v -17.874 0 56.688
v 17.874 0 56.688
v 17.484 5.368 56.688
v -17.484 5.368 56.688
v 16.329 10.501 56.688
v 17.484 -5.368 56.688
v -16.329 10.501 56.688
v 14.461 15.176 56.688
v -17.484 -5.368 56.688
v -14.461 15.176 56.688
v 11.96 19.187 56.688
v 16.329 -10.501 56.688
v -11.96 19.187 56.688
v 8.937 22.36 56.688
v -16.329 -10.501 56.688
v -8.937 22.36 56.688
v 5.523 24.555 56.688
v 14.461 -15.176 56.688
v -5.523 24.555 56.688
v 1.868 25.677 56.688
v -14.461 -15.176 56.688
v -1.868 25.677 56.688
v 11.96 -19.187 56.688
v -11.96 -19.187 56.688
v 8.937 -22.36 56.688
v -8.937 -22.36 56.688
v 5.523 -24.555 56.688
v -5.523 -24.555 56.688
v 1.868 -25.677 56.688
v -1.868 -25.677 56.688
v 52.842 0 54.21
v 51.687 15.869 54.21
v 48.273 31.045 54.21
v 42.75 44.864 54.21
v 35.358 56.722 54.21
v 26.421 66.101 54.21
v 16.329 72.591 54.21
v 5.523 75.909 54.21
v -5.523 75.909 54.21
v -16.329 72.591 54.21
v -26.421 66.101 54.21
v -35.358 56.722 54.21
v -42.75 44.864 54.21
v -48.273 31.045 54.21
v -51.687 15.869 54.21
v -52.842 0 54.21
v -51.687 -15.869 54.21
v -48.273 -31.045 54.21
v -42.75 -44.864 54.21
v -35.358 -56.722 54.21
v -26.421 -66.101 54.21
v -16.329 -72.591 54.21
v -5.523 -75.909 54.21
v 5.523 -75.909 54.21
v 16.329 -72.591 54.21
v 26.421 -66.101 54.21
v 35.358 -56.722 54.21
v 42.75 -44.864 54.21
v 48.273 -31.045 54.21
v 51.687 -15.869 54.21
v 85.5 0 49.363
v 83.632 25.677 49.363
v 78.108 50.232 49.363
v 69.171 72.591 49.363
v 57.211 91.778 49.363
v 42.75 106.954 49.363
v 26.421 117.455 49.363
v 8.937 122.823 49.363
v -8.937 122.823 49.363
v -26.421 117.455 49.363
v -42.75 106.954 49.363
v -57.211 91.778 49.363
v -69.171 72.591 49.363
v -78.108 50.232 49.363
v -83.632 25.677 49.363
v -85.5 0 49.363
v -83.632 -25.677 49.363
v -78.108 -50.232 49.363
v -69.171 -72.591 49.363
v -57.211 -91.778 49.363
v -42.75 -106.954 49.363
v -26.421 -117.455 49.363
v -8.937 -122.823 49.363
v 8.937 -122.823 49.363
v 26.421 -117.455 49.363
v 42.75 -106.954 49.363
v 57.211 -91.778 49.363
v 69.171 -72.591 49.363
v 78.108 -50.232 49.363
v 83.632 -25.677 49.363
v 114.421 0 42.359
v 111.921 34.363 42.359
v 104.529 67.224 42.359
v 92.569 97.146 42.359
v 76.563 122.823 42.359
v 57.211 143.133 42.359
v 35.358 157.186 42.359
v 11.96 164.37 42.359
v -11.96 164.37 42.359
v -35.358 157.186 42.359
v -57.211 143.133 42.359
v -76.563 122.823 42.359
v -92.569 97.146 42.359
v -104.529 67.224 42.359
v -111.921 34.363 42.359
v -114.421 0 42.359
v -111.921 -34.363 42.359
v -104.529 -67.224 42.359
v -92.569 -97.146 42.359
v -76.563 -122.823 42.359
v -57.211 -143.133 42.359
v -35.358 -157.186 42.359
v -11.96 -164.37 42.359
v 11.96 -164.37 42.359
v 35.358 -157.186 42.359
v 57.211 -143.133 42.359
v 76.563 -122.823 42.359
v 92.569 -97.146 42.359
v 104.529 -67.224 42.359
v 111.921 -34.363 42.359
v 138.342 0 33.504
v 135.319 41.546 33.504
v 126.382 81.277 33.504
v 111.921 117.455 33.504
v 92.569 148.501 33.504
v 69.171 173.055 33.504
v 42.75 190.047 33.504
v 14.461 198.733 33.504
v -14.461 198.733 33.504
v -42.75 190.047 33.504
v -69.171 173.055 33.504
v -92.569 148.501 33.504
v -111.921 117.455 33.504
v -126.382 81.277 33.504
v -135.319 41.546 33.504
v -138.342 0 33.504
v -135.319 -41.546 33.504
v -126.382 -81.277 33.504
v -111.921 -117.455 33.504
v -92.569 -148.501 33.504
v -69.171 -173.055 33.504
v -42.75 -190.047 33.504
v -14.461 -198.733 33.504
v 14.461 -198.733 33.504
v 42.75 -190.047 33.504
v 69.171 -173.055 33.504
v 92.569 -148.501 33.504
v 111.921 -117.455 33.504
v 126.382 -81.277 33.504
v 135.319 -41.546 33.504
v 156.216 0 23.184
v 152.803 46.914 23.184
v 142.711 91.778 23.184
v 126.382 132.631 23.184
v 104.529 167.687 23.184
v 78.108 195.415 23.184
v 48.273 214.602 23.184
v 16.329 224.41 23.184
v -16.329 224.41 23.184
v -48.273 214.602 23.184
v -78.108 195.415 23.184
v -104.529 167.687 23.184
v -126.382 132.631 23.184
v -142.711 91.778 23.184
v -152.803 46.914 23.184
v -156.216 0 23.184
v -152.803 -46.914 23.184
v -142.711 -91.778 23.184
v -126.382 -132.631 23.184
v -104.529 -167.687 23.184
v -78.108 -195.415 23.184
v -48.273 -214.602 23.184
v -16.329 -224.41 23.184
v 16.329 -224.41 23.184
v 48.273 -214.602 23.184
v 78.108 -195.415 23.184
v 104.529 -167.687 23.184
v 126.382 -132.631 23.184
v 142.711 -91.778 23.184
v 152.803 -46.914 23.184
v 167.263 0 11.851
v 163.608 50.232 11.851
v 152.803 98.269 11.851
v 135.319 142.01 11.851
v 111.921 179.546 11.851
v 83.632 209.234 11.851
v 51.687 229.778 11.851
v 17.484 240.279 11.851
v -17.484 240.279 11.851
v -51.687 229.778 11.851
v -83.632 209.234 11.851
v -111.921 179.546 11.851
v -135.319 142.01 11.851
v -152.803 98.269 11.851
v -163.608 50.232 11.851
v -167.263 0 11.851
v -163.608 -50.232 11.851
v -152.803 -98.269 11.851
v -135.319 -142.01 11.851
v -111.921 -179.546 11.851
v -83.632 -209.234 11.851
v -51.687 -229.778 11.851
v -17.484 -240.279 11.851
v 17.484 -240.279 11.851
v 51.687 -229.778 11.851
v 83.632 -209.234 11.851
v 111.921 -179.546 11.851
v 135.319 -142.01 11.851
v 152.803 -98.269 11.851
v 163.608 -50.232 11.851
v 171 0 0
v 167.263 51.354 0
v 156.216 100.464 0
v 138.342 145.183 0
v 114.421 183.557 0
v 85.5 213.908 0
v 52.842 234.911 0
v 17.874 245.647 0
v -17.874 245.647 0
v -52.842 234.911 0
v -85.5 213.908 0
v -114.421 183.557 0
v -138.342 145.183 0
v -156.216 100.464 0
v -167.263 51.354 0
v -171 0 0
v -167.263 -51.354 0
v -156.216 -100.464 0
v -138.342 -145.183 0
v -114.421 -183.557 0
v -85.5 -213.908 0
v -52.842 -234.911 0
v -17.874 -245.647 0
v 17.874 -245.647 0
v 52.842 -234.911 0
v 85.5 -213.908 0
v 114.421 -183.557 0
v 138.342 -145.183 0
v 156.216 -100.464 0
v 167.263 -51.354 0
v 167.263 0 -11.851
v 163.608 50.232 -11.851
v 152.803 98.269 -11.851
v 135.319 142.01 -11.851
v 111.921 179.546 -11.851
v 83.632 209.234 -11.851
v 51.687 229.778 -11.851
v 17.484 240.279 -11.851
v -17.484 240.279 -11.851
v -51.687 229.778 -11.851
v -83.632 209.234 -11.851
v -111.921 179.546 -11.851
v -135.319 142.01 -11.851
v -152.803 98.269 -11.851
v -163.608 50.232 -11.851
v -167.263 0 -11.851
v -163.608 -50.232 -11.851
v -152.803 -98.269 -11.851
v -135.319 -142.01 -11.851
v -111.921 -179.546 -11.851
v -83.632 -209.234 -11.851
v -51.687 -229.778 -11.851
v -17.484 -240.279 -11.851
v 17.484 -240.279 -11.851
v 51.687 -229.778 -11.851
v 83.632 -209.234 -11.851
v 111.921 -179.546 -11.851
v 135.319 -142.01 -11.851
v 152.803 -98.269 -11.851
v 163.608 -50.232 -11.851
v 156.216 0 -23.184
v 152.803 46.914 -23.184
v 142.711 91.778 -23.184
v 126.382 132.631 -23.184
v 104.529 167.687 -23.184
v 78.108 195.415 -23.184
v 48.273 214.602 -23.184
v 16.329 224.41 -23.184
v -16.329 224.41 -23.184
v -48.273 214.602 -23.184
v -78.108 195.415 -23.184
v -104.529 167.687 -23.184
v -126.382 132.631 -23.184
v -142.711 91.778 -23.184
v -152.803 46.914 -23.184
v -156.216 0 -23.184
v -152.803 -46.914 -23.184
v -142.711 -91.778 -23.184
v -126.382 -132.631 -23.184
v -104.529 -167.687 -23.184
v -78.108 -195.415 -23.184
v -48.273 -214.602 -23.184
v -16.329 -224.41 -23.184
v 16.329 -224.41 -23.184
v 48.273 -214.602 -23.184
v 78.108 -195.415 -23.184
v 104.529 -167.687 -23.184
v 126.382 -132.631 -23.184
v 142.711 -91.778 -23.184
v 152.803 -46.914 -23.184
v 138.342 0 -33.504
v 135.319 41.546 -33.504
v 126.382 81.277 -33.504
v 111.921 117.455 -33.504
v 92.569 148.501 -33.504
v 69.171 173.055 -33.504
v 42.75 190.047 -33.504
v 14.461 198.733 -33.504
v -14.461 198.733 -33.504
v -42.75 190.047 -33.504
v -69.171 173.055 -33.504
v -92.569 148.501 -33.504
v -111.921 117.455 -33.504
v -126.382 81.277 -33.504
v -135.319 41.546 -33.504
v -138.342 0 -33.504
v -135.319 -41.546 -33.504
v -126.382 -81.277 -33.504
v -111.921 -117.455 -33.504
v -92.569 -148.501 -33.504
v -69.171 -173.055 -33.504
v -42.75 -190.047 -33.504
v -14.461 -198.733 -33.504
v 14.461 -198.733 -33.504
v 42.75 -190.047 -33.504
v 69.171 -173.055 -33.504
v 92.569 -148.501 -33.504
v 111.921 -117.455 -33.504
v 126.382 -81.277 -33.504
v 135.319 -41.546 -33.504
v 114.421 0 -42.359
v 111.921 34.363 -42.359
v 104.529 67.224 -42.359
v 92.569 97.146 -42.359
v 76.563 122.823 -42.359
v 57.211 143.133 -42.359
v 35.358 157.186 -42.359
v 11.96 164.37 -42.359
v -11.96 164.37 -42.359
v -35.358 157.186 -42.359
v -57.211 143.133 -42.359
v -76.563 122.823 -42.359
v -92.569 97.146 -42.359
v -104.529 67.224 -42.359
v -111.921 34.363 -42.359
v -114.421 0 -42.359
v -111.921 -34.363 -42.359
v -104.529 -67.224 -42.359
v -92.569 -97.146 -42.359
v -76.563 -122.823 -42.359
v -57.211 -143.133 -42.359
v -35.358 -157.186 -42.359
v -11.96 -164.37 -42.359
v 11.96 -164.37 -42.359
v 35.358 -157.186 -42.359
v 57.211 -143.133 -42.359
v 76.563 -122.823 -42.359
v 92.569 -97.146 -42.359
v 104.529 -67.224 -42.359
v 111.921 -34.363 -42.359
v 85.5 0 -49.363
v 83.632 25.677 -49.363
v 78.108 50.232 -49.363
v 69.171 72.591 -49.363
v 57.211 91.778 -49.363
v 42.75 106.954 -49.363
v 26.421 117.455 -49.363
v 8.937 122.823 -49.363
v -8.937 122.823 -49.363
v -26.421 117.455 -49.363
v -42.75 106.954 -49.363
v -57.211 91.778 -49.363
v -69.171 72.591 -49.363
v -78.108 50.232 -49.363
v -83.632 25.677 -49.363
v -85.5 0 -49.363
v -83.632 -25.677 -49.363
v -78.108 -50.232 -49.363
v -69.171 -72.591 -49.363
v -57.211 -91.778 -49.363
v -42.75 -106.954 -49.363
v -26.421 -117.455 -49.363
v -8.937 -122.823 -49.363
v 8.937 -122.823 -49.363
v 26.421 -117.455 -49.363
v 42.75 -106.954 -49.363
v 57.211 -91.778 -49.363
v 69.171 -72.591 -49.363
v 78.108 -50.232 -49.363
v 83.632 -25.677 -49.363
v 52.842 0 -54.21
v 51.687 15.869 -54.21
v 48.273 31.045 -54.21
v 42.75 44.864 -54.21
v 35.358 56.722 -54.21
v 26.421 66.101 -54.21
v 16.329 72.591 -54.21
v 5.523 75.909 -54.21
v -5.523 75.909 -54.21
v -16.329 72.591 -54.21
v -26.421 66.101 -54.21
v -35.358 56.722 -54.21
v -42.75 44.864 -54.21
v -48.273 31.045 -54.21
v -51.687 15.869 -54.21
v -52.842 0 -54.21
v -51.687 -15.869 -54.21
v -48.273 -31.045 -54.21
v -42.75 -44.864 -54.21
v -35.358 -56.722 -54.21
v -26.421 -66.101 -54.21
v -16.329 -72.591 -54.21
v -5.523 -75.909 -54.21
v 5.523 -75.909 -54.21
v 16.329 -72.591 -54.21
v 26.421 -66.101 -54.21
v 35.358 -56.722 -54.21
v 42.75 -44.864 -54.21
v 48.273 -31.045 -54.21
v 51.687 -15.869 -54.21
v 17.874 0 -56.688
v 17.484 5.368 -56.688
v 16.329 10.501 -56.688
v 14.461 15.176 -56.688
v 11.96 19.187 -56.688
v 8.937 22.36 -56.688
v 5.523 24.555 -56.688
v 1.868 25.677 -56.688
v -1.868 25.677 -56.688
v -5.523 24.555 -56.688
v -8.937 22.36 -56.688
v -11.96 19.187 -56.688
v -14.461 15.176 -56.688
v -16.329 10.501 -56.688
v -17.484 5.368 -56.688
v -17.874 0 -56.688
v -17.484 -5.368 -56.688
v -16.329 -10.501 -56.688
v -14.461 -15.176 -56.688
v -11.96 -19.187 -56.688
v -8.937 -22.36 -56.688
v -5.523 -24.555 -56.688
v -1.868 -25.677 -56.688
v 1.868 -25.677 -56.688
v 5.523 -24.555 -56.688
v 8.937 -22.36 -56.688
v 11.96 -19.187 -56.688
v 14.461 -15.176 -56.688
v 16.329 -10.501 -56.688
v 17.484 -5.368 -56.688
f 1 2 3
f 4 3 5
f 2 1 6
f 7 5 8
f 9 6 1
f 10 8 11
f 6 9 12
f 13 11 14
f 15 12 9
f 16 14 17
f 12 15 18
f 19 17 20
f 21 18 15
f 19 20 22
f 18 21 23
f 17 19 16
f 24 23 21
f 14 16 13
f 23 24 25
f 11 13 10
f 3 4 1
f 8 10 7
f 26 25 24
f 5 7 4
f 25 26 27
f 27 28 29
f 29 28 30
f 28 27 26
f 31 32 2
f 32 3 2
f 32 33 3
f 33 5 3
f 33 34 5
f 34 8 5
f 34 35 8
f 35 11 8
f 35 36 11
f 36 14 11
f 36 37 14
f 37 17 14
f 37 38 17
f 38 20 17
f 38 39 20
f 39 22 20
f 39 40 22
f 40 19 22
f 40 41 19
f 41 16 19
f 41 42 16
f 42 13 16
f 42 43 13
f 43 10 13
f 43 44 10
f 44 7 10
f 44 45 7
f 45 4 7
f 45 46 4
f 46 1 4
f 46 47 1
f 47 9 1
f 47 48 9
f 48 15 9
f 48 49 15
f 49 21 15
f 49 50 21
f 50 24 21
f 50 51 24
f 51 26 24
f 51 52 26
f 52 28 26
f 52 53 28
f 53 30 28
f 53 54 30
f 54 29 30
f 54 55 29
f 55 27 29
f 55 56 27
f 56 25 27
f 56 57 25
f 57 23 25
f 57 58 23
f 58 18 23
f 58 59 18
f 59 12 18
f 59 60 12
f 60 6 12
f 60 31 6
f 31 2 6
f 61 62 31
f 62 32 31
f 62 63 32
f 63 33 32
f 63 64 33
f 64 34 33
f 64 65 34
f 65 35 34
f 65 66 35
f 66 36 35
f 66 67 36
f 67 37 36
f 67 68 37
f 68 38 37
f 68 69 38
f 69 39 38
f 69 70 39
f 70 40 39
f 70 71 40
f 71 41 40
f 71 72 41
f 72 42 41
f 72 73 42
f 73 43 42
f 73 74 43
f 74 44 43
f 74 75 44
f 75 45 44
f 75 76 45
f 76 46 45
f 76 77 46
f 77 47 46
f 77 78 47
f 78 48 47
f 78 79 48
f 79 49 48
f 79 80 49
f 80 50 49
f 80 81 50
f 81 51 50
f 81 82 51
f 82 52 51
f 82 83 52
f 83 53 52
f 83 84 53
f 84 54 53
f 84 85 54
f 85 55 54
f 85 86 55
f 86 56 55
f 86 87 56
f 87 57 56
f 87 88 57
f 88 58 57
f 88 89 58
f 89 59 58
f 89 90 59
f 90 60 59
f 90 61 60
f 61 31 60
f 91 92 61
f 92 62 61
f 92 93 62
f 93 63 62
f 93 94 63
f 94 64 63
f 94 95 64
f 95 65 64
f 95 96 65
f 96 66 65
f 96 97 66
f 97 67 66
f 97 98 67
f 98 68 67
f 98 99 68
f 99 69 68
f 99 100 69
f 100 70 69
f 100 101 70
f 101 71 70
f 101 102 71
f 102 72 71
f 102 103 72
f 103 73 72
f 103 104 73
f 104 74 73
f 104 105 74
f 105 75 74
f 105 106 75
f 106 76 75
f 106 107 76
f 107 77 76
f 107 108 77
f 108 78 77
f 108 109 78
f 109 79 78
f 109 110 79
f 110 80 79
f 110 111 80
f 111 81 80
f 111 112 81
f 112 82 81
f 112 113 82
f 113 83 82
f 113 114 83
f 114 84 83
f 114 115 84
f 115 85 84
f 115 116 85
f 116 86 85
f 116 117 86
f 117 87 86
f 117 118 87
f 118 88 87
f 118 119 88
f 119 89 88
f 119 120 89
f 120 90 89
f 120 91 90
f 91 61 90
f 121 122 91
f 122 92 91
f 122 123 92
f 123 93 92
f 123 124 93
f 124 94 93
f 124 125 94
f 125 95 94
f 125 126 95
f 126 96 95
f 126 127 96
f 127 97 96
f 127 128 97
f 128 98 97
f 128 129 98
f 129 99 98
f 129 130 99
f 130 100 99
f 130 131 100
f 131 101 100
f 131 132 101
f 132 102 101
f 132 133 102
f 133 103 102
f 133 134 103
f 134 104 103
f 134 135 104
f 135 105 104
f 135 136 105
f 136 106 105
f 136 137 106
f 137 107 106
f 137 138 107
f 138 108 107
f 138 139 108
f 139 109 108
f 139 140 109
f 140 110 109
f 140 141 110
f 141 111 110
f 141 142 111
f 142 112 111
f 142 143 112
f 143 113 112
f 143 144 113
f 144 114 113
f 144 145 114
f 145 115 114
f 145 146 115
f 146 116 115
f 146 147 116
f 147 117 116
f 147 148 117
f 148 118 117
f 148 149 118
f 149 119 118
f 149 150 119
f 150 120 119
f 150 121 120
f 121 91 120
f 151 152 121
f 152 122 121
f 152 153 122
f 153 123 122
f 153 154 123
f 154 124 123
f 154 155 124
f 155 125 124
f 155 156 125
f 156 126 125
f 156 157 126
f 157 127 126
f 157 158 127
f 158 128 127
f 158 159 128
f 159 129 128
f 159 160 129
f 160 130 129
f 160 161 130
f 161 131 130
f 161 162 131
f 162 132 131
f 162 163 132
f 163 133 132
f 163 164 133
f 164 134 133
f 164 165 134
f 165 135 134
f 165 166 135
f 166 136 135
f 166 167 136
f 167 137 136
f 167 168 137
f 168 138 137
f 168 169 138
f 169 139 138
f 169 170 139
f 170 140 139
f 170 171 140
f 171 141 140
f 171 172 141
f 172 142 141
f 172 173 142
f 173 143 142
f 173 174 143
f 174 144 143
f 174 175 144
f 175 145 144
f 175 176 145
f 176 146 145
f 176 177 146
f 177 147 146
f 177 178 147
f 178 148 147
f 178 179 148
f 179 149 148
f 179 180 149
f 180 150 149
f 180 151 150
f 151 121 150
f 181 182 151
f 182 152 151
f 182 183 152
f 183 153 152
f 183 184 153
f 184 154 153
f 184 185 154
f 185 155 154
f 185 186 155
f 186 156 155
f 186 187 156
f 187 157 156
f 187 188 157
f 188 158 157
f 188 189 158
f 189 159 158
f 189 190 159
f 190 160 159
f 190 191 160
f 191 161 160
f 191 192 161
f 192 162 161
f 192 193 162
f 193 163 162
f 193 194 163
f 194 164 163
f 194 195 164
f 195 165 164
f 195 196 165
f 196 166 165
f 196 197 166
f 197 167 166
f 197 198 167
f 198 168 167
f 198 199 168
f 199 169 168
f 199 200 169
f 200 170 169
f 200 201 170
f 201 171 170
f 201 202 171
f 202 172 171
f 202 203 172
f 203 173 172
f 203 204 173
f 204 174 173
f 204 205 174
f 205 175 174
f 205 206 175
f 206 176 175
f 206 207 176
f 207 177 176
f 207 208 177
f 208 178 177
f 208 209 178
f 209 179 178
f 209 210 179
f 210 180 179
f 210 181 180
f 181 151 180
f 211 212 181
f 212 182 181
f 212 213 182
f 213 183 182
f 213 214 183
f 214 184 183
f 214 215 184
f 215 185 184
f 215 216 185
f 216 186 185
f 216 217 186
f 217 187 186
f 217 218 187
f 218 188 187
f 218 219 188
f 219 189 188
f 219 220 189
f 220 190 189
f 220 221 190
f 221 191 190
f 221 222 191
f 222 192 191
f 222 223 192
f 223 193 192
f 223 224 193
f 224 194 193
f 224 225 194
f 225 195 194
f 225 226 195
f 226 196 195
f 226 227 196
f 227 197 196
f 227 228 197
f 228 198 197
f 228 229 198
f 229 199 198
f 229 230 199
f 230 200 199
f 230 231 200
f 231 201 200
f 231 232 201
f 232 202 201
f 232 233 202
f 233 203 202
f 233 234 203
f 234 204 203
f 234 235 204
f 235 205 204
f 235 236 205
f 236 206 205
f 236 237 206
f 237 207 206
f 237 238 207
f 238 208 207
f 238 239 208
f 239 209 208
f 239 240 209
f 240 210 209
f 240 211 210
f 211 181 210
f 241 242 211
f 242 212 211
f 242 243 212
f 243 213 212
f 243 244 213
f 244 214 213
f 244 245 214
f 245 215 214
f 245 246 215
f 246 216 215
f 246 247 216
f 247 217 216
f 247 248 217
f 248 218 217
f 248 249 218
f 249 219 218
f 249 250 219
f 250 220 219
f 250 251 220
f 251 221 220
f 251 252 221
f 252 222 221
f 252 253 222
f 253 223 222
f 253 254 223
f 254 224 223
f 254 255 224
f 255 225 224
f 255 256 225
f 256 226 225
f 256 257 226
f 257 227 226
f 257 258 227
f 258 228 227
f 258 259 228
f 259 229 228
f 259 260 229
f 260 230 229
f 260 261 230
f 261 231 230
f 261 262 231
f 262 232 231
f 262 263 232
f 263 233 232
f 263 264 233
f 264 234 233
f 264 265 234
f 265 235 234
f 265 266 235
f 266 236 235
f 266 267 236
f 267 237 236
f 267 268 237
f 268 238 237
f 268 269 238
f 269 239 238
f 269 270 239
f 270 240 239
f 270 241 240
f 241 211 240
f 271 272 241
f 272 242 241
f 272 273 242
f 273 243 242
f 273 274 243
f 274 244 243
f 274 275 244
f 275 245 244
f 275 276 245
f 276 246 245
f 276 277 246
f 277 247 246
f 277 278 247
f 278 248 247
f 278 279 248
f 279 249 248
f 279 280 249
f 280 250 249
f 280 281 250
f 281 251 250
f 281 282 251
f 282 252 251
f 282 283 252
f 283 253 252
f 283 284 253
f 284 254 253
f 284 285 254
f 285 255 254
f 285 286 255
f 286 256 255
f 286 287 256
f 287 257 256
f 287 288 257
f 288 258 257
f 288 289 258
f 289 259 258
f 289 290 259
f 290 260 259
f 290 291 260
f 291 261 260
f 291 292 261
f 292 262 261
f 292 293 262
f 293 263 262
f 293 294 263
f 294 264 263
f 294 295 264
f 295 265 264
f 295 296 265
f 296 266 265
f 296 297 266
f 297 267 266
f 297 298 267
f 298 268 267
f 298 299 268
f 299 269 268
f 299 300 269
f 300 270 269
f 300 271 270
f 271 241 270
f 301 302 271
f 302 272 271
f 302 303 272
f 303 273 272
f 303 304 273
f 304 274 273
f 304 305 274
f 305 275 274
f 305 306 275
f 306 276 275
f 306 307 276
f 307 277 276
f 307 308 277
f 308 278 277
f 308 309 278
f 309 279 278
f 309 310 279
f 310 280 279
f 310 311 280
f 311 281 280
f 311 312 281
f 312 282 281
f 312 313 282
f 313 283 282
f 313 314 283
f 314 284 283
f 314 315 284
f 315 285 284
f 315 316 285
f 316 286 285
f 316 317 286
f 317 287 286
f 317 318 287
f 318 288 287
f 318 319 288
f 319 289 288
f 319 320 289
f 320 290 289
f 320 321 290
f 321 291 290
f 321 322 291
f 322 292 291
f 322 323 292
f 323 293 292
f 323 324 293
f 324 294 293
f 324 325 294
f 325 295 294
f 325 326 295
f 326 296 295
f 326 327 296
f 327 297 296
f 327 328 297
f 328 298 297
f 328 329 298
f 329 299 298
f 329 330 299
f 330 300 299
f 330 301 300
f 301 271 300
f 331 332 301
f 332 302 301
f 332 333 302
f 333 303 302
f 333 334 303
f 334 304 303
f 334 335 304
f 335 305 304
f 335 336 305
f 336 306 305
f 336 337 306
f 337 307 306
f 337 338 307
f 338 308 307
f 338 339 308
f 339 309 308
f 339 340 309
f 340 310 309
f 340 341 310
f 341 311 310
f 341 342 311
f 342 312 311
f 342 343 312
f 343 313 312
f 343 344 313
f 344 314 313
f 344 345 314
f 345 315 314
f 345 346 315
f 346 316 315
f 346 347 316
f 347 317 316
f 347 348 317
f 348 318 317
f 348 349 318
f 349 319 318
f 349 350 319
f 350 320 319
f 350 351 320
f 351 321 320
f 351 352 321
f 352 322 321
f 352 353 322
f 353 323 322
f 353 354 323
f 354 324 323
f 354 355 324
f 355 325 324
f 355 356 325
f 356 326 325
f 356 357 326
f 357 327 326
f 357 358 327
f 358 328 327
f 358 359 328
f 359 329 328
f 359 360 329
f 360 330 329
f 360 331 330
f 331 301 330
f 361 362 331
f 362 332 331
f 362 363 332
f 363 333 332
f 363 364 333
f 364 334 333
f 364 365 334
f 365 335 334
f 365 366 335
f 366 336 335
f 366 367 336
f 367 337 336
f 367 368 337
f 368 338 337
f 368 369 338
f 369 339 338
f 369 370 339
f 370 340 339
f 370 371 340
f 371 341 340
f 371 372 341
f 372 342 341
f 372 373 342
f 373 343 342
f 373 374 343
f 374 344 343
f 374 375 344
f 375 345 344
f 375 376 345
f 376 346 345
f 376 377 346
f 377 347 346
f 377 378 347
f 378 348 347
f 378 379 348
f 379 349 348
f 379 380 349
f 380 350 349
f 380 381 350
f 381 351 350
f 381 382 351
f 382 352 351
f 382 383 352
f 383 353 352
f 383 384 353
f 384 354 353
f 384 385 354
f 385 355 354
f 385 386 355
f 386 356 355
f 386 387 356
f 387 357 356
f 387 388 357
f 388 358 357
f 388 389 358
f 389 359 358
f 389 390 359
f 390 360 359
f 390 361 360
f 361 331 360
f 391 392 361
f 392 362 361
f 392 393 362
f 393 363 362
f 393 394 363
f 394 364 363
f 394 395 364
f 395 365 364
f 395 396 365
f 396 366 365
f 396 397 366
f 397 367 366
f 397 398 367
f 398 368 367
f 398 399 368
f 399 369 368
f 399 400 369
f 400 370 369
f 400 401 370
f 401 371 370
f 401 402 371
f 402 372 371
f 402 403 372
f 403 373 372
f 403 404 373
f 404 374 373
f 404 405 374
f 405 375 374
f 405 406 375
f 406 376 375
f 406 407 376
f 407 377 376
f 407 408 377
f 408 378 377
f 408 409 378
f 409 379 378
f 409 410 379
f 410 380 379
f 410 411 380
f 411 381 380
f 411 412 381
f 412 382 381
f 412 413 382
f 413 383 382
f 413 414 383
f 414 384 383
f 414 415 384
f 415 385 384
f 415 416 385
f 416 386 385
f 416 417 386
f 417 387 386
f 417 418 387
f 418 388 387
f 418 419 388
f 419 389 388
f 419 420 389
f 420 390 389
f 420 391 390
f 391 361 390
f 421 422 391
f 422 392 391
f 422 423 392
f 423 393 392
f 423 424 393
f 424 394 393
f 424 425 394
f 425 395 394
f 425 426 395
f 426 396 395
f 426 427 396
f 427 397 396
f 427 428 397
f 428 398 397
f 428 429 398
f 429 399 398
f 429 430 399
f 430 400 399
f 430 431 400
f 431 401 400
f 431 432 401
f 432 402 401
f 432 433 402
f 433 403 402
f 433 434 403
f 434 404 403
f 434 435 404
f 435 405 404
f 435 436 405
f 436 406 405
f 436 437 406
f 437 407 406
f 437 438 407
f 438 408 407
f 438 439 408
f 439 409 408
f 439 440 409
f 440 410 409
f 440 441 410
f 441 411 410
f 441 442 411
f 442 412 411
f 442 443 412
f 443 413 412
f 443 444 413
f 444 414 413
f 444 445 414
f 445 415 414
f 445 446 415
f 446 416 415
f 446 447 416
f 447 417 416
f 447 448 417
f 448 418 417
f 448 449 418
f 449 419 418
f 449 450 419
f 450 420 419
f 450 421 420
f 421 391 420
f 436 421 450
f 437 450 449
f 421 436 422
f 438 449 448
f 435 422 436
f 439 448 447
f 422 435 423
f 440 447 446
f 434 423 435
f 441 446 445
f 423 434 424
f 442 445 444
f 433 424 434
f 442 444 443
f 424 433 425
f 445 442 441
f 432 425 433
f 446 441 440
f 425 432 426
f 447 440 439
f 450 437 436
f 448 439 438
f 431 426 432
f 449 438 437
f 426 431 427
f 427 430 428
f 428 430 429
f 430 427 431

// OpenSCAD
// Generated by SolidPython 1.0.1 on 2020-07-29 00:46:48


scale(v = [9, 13, 3]) {
	sphere(r = 19);
}
/***********************************************
*********      SolidPython code:      **********
************************************************
 
# import packages: SolidPython
from solid import *
from solid.utils import *
from itertools import chain, combinations, permutations


class Resize:

    def __init__(self, scad_file):
        self.scad_file = scad_file
        #self.scad_file = import_scad(scad_file)
        # cone/cylinder param:
        self.r1 = 0
        self.r2 = 0
        self.h = 0
        # rectangular prism param:
        self.w = 0
        self.l = 0
        # ellipse param:
        self.r = 0

    # import OpenScad code (file name corresponds to shape)


    # classify shape + parameters
    def assign(self, param1, param2, param3):
        if self.scad_file == 'cone.scad':
            self.r1 = param1
            self.r2 = param2
            self.h = param3
        elif self.scad_file == 'cylinder.scad':
            self.r1 = param1
            self.r2 = param2
            self.h = param3
        elif self.scad_file == 'rectangularPrism.scad':
            self.h = param1
            self.l = param2
            self.w = param3
        else:
            self.r = param1
            self.h = param2

    # resize parameters
    def iterate(self):
        x = range(3, 20, 2)
        i = 1
        if self.scad_file == 'cone.scad':
            tempList = list(permutations(x, 2))
            for temp in tempList:
                param1 = temp[0]
                param2 = temp[1]
                filepath = 'produced_scad_files/' + 'cone' + str(param1) + '_' + str(param2) + '_' + '.scad'
                scad_render_to_file(cylinder(h=param1, r1=param2, r2=0), filepath)

        elif self.scad_file == 'cylinder.scad':
            tempList = list(permutations(x, 3))
            for temp in tempList:
                param1 = temp[0]
                param2 = temp[1]
                filepath = 'produced_scad_files/' + 'cylinder' + str(param1) + '_' + str(param2) + '_' + '.scad'
                scad_render_to_file(cylinder(h=param1, r1=param2, r2=param2), filepath)

        elif self.scad_file == 'rectangularPrism.scad':
            tempList = list(permutations(x, 3))
            for temp in tempList:
                param1 = temp[0]
                param2 = temp[1]
                param3 = temp[2]
                filepath = 'produced_scad_files/' + 'rectangularPrism' + str(param1) + '_' + str(param2) + '_' + str(
                    param3) + '.scad'
                scad_render_to_file(cube(size=(param1, param2, param3)), filepath)

        elif self.scad_file == 'ellipse.scad':
            tempList = list(permutations(x, 4))
            for temp in tempList:
                param1 = temp[0]
                param2 = temp[1]
                param3 = temp[2]
                param4 = temp[3]
                filepath = 'produced_scad_files/' + 'ellipse' + str(param1) + '_' + str(param2) + '_' + str(param3) + '_' + str(param4) + '.scad'
                scad_render_to_file(scale([param1, param2, param3])(sphere(r=param4)), filepath)

    def render_to_scadfile(self):
        scad_render_to_file(scad, 'example.scad') 
 
************************************************/
